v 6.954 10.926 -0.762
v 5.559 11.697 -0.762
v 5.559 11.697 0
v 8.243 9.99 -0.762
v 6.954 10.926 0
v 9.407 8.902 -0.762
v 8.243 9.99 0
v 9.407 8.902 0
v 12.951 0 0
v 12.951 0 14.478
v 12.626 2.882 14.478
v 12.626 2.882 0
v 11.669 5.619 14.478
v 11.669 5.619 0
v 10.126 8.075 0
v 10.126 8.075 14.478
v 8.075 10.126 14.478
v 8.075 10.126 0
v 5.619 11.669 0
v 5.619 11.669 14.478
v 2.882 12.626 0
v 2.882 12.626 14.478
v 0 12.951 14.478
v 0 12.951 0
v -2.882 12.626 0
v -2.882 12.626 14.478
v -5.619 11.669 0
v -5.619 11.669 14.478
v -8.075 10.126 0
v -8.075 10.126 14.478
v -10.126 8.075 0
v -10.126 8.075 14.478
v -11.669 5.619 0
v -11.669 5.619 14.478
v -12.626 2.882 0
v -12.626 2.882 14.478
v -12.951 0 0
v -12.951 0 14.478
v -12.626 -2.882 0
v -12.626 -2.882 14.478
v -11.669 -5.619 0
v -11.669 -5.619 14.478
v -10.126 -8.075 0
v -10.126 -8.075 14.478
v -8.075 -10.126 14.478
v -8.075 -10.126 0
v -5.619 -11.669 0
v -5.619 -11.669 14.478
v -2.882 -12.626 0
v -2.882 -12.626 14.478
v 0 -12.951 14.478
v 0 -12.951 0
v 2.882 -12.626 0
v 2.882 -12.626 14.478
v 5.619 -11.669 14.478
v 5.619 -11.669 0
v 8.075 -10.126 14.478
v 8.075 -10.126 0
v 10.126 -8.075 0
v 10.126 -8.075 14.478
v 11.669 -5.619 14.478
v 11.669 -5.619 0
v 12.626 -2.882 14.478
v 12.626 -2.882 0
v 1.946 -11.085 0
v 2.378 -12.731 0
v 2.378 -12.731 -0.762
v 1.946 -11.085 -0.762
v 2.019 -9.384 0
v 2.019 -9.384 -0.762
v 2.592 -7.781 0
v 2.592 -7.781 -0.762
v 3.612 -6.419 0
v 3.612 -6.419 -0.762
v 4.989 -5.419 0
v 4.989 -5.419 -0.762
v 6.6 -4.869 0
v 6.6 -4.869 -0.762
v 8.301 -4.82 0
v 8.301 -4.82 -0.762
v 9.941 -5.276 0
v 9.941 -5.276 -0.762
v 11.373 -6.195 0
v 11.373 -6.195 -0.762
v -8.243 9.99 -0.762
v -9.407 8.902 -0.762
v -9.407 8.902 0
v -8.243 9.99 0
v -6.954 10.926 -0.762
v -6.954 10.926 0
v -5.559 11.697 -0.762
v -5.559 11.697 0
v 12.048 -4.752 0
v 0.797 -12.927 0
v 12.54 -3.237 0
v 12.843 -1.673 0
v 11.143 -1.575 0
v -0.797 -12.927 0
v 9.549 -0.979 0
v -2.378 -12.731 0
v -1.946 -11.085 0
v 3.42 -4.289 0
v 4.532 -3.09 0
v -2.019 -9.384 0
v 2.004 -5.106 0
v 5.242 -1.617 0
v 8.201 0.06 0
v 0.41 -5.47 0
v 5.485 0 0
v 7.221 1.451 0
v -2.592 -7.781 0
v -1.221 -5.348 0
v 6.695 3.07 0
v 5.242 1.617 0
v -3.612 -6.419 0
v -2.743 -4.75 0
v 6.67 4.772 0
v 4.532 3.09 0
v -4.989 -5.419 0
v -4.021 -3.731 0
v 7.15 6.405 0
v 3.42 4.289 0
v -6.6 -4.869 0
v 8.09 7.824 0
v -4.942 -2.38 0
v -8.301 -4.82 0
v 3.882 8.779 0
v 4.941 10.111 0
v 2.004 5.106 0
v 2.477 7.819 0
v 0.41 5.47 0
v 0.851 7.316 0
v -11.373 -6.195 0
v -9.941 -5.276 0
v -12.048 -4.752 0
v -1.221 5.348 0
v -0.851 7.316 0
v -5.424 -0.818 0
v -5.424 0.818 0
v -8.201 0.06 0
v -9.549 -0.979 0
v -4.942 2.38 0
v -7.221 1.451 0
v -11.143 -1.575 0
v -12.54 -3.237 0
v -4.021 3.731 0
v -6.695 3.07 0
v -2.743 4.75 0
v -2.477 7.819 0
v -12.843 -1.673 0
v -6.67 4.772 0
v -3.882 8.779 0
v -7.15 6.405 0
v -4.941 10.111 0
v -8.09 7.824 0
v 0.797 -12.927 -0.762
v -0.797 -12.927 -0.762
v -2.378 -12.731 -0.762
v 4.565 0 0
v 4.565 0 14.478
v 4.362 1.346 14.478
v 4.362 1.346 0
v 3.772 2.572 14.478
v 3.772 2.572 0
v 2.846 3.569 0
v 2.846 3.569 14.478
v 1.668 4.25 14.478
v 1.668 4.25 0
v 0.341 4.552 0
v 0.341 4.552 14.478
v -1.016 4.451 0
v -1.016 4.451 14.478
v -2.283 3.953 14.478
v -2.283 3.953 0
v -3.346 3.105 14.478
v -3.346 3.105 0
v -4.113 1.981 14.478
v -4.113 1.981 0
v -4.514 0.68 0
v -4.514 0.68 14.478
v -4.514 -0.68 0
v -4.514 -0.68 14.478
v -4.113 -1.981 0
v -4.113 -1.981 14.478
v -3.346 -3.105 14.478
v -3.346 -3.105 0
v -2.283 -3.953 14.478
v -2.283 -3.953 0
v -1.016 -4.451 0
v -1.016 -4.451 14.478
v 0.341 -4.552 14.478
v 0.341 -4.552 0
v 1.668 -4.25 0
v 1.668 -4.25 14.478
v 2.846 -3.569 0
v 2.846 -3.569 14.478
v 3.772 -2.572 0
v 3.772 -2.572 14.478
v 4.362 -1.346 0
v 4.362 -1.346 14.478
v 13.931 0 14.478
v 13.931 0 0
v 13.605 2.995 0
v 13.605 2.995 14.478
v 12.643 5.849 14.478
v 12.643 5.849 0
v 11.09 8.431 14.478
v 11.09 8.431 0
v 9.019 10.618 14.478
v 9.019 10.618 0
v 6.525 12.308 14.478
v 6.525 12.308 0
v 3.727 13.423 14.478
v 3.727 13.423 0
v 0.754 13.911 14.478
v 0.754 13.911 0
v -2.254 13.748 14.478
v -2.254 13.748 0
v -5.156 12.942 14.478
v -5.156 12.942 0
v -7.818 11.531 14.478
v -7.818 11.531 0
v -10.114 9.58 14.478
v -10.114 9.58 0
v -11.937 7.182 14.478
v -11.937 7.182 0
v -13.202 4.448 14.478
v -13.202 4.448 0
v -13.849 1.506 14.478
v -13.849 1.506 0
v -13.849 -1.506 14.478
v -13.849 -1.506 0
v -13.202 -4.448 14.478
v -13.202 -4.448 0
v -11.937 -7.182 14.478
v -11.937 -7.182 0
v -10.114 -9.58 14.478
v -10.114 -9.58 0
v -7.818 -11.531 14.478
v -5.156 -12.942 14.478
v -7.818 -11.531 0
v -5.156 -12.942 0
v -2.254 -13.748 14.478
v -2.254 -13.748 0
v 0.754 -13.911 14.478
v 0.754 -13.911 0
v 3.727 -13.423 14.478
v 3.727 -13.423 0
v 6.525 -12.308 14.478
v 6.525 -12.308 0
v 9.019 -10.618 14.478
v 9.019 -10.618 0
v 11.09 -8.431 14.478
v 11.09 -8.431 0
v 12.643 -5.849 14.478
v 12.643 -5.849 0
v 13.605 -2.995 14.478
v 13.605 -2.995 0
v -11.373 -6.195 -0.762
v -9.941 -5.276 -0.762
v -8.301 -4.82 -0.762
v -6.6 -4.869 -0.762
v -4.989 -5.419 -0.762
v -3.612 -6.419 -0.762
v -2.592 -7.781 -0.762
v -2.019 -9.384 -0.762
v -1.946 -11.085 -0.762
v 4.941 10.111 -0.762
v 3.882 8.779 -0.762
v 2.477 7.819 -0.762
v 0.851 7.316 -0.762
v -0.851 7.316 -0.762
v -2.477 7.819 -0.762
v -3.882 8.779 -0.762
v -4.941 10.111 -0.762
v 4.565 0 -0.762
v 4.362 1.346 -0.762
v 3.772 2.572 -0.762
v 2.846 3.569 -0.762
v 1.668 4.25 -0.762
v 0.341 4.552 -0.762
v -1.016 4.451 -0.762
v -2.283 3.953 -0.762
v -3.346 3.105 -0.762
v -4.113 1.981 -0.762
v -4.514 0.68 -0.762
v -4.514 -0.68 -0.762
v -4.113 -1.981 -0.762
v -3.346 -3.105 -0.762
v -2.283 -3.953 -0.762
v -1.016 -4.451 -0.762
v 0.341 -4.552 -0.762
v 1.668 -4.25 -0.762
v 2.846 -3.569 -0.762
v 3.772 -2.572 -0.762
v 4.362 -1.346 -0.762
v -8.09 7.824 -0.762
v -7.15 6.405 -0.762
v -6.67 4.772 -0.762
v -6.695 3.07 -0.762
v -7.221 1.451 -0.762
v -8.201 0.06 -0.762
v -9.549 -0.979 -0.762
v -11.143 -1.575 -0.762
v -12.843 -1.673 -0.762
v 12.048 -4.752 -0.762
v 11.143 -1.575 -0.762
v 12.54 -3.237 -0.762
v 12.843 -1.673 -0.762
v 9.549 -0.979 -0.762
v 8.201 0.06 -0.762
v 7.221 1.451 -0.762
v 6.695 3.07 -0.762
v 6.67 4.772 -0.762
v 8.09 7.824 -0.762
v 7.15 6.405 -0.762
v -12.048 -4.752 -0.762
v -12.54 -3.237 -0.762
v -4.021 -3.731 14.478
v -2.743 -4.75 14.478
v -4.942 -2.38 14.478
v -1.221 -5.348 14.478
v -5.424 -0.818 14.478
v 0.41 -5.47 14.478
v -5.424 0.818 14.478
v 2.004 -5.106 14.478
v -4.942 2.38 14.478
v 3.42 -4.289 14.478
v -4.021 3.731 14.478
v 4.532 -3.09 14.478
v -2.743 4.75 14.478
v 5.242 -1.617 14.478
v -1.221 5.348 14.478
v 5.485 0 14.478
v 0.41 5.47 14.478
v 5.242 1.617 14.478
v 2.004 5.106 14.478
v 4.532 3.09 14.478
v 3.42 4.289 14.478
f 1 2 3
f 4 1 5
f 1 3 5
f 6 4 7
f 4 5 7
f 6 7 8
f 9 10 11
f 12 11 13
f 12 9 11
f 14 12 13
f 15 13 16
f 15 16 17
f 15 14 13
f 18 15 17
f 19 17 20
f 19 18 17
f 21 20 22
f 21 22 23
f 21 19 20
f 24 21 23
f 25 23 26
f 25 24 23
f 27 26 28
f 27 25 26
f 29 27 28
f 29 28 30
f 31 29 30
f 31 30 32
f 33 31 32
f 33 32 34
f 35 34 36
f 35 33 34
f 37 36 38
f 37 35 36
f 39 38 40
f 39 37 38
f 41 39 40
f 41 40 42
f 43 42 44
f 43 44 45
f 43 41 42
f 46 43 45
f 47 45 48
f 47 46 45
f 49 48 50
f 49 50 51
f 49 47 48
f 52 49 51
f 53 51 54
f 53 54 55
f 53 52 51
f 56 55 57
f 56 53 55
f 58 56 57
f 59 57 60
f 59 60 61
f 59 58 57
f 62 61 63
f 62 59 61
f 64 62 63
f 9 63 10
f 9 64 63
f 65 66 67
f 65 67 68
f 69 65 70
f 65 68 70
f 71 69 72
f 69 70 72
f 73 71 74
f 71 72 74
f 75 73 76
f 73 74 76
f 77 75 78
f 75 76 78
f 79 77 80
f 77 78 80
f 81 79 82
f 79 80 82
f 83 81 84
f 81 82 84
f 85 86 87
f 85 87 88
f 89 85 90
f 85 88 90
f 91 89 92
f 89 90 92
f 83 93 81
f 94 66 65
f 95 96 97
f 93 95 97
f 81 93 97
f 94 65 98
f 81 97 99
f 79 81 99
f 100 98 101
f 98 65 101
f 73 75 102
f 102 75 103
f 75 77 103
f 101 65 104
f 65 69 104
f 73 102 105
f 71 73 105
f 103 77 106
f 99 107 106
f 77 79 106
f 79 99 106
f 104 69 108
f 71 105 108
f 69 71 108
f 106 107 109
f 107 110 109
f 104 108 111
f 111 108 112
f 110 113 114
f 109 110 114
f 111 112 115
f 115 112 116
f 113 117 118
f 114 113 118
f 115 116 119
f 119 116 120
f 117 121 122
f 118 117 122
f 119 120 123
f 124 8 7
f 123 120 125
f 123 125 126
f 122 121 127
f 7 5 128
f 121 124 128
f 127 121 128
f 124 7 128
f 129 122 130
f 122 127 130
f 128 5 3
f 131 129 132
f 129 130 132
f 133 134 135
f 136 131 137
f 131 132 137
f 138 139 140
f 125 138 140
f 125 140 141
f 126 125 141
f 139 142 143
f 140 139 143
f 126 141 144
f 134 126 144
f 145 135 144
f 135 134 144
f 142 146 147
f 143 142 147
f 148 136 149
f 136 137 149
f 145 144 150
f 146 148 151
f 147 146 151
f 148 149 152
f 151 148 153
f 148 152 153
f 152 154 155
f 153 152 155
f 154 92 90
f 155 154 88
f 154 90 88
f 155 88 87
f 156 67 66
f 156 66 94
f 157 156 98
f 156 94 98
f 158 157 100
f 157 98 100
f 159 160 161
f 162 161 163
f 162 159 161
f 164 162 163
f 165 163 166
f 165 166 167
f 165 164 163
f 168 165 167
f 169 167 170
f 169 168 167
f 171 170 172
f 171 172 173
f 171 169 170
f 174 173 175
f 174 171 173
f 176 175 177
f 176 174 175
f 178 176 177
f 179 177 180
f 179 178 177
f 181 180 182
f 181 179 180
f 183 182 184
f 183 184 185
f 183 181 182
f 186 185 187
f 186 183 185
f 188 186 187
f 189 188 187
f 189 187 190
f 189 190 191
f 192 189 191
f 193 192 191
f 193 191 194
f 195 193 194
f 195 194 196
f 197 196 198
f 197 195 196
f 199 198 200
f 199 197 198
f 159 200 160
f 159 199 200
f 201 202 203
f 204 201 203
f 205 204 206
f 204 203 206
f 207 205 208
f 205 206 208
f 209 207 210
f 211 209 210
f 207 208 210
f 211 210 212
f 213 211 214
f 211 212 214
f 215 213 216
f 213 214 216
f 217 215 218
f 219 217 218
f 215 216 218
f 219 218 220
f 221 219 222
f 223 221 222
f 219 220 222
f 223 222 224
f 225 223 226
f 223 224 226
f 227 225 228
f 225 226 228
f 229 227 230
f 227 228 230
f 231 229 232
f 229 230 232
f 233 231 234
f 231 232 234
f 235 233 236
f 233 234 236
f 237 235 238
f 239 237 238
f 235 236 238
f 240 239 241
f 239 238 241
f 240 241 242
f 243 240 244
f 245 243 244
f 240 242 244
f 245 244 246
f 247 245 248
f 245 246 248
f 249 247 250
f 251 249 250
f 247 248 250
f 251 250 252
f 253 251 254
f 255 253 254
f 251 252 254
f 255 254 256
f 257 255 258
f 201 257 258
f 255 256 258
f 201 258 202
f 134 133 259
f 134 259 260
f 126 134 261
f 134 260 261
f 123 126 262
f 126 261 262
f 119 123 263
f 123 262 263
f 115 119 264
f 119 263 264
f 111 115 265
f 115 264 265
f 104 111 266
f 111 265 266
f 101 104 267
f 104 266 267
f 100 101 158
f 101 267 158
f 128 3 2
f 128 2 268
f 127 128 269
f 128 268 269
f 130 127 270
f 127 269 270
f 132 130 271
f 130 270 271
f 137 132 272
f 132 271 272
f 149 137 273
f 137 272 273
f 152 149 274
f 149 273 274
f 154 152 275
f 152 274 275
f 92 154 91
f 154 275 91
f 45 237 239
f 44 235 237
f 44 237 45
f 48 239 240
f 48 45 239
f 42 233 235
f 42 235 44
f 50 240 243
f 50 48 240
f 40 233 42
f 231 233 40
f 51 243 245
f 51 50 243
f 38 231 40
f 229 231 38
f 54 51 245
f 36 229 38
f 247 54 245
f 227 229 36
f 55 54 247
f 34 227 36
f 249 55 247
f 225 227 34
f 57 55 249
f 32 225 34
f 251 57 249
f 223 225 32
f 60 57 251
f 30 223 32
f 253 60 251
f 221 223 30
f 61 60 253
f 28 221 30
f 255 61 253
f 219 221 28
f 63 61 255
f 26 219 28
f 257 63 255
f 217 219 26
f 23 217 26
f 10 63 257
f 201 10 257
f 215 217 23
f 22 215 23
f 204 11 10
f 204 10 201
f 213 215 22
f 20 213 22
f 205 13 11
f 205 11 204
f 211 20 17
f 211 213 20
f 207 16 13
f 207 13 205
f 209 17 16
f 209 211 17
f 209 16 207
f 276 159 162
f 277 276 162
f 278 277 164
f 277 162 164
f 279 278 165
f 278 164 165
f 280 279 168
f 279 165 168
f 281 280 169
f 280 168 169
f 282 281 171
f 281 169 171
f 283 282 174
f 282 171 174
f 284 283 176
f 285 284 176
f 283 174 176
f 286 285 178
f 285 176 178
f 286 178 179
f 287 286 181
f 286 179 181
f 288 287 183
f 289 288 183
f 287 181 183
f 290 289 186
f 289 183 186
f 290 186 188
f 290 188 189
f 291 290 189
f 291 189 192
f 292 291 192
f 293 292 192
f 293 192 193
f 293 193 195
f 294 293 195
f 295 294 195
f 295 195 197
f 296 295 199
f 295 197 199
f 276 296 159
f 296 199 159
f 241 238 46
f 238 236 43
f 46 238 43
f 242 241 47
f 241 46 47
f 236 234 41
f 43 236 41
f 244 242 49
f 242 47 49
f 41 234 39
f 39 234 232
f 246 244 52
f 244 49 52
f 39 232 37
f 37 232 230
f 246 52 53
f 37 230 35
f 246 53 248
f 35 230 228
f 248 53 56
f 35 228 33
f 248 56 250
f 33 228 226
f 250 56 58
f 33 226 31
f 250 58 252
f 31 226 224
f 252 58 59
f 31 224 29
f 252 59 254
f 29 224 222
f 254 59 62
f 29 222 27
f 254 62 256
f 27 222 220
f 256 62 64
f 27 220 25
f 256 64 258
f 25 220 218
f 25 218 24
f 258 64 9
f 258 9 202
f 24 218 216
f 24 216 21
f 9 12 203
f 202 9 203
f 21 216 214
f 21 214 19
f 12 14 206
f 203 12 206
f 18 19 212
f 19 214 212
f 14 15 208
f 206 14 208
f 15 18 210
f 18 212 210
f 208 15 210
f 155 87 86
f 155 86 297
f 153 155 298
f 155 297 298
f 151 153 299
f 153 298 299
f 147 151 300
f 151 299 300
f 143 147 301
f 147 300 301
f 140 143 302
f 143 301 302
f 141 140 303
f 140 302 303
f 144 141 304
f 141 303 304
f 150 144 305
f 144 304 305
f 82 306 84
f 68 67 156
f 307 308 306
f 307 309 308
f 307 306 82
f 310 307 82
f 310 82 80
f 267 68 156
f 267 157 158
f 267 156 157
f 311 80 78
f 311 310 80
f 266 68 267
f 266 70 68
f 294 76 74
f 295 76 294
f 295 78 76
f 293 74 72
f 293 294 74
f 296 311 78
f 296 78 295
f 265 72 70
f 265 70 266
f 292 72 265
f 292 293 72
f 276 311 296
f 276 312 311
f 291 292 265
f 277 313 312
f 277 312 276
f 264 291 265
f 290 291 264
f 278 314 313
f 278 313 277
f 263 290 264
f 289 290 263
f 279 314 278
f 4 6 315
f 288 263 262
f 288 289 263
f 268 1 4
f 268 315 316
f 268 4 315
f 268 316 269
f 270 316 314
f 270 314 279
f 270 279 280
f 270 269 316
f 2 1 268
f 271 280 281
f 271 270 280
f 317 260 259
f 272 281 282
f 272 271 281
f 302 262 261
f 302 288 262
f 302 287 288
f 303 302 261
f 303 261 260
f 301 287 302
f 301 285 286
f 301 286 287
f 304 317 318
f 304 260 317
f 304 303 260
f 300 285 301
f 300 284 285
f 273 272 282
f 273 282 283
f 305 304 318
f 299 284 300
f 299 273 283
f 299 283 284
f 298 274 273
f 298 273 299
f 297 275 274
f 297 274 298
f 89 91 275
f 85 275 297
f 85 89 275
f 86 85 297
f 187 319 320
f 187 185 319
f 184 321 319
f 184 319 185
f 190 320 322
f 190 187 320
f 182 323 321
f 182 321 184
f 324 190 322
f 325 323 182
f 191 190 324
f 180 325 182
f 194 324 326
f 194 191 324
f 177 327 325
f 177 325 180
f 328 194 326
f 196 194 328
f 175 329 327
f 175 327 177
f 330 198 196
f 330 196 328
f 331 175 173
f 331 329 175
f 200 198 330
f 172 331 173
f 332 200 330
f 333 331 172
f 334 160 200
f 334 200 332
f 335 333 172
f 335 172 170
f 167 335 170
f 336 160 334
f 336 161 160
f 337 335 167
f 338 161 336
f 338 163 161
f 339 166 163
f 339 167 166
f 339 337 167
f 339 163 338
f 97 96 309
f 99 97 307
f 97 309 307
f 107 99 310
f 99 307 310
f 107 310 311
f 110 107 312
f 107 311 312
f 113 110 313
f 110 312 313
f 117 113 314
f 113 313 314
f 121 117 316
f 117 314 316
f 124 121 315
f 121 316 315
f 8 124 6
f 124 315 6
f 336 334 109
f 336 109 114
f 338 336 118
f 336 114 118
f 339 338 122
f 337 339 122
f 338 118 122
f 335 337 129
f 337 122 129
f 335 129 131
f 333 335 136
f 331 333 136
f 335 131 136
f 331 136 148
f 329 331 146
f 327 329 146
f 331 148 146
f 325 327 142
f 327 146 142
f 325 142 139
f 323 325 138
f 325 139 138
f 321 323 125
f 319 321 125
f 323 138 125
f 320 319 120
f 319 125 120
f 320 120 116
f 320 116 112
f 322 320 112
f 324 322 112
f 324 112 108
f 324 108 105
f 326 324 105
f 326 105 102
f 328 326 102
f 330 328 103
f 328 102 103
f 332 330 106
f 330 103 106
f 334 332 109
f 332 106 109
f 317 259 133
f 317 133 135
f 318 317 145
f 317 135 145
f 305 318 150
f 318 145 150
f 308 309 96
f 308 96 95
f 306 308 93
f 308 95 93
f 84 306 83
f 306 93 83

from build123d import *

# Parameters (mm, degrees)
SKETCH1_R             = 13.931034295
SKETCH1_R_2           = 12.951126788
BOSS_EXTRUDE1_DEPTH   = 14.478
SKETCH1_R_3           = 5.48525759
SKETCH1_R_4           = 4.565095147
BOSS_EXTRUDE1_2_DEPTH = 14.478
SKETCH2_R             = 12.951126788
BOSS_EXTRUDE2_DEPTH   = 0.762
SKETCH4_R             = 5.699074366
CUT_EXTRUDE2_DEPTH    = 0.762
CIRPATTERN2_COUNT     = 5
SKETCH6_R             = 4.565095147
CUT_EXTRUDE3_DEPTH    = 0.762


with BuildPart() as part:
    # Sketch1 → Boss-Extrude1 (new body)
    with BuildSketch(Plane.XY):
        Circle(SKETCH1_R)
        Circle(SKETCH1_R_2, mode=Mode.SUBTRACT)
    extrude(amount=BOSS_EXTRUDE1_DEPTH)


with BuildPart() as body_2:
    # Sketch1 → Boss-Extrude1 2 (new body)
    with BuildSketch(Plane.XY):
        Circle(SKETCH1_R_3)
        Circle(SKETCH1_R_4, mode=Mode.SUBTRACT)
    extrude(amount=BOSS_EXTRUDE1_2_DEPTH)

    # Sketch2 → Boss-Extrude2 (add)
    with BuildSketch(Plane(origin=(0, 0, 0), x_dir=(-1, 0, 0), z_dir=(0, 0, -1))):
        Circle(SKETCH2_R)
    extrude(amount=BOSS_EXTRUDE2_DEPTH)

    # Sketch4 → Cut-Extrude2 (cut)
    with BuildSketch(Plane(origin=(0, 0, -0.762), x_dir=(-1, 0, 0), z_dir=(0, 0, -1))):
        with Locations((0, 12.951126788)):
            Circle(SKETCH4_R)
    cut_extrude2 = extrude(amount=-CUT_EXTRUDE2_DEPTH, mode=Mode.SUBTRACT)

    # CirPattern2: Cut-Extrude2 ×5 about axis
    cirpattern2_axis = Axis((0, 0, 0), (0, 0, 1))
    for i in range(1, CIRPATTERN2_COUNT):
        add(cut_extrude2.rotate(cirpattern2_axis, i * 360 / CIRPATTERN2_COUNT), mode=Mode.SUBTRACT)

    # Sketch6 → Cut-Extrude3 (cut)
    with BuildSketch(Plane.XY):
        Circle(SKETCH6_R)
    extrude(amount=-CUT_EXTRUDE3_DEPTH, mode=Mode.SUBTRACT)


solid = Compound([part.part, body_2.part])
